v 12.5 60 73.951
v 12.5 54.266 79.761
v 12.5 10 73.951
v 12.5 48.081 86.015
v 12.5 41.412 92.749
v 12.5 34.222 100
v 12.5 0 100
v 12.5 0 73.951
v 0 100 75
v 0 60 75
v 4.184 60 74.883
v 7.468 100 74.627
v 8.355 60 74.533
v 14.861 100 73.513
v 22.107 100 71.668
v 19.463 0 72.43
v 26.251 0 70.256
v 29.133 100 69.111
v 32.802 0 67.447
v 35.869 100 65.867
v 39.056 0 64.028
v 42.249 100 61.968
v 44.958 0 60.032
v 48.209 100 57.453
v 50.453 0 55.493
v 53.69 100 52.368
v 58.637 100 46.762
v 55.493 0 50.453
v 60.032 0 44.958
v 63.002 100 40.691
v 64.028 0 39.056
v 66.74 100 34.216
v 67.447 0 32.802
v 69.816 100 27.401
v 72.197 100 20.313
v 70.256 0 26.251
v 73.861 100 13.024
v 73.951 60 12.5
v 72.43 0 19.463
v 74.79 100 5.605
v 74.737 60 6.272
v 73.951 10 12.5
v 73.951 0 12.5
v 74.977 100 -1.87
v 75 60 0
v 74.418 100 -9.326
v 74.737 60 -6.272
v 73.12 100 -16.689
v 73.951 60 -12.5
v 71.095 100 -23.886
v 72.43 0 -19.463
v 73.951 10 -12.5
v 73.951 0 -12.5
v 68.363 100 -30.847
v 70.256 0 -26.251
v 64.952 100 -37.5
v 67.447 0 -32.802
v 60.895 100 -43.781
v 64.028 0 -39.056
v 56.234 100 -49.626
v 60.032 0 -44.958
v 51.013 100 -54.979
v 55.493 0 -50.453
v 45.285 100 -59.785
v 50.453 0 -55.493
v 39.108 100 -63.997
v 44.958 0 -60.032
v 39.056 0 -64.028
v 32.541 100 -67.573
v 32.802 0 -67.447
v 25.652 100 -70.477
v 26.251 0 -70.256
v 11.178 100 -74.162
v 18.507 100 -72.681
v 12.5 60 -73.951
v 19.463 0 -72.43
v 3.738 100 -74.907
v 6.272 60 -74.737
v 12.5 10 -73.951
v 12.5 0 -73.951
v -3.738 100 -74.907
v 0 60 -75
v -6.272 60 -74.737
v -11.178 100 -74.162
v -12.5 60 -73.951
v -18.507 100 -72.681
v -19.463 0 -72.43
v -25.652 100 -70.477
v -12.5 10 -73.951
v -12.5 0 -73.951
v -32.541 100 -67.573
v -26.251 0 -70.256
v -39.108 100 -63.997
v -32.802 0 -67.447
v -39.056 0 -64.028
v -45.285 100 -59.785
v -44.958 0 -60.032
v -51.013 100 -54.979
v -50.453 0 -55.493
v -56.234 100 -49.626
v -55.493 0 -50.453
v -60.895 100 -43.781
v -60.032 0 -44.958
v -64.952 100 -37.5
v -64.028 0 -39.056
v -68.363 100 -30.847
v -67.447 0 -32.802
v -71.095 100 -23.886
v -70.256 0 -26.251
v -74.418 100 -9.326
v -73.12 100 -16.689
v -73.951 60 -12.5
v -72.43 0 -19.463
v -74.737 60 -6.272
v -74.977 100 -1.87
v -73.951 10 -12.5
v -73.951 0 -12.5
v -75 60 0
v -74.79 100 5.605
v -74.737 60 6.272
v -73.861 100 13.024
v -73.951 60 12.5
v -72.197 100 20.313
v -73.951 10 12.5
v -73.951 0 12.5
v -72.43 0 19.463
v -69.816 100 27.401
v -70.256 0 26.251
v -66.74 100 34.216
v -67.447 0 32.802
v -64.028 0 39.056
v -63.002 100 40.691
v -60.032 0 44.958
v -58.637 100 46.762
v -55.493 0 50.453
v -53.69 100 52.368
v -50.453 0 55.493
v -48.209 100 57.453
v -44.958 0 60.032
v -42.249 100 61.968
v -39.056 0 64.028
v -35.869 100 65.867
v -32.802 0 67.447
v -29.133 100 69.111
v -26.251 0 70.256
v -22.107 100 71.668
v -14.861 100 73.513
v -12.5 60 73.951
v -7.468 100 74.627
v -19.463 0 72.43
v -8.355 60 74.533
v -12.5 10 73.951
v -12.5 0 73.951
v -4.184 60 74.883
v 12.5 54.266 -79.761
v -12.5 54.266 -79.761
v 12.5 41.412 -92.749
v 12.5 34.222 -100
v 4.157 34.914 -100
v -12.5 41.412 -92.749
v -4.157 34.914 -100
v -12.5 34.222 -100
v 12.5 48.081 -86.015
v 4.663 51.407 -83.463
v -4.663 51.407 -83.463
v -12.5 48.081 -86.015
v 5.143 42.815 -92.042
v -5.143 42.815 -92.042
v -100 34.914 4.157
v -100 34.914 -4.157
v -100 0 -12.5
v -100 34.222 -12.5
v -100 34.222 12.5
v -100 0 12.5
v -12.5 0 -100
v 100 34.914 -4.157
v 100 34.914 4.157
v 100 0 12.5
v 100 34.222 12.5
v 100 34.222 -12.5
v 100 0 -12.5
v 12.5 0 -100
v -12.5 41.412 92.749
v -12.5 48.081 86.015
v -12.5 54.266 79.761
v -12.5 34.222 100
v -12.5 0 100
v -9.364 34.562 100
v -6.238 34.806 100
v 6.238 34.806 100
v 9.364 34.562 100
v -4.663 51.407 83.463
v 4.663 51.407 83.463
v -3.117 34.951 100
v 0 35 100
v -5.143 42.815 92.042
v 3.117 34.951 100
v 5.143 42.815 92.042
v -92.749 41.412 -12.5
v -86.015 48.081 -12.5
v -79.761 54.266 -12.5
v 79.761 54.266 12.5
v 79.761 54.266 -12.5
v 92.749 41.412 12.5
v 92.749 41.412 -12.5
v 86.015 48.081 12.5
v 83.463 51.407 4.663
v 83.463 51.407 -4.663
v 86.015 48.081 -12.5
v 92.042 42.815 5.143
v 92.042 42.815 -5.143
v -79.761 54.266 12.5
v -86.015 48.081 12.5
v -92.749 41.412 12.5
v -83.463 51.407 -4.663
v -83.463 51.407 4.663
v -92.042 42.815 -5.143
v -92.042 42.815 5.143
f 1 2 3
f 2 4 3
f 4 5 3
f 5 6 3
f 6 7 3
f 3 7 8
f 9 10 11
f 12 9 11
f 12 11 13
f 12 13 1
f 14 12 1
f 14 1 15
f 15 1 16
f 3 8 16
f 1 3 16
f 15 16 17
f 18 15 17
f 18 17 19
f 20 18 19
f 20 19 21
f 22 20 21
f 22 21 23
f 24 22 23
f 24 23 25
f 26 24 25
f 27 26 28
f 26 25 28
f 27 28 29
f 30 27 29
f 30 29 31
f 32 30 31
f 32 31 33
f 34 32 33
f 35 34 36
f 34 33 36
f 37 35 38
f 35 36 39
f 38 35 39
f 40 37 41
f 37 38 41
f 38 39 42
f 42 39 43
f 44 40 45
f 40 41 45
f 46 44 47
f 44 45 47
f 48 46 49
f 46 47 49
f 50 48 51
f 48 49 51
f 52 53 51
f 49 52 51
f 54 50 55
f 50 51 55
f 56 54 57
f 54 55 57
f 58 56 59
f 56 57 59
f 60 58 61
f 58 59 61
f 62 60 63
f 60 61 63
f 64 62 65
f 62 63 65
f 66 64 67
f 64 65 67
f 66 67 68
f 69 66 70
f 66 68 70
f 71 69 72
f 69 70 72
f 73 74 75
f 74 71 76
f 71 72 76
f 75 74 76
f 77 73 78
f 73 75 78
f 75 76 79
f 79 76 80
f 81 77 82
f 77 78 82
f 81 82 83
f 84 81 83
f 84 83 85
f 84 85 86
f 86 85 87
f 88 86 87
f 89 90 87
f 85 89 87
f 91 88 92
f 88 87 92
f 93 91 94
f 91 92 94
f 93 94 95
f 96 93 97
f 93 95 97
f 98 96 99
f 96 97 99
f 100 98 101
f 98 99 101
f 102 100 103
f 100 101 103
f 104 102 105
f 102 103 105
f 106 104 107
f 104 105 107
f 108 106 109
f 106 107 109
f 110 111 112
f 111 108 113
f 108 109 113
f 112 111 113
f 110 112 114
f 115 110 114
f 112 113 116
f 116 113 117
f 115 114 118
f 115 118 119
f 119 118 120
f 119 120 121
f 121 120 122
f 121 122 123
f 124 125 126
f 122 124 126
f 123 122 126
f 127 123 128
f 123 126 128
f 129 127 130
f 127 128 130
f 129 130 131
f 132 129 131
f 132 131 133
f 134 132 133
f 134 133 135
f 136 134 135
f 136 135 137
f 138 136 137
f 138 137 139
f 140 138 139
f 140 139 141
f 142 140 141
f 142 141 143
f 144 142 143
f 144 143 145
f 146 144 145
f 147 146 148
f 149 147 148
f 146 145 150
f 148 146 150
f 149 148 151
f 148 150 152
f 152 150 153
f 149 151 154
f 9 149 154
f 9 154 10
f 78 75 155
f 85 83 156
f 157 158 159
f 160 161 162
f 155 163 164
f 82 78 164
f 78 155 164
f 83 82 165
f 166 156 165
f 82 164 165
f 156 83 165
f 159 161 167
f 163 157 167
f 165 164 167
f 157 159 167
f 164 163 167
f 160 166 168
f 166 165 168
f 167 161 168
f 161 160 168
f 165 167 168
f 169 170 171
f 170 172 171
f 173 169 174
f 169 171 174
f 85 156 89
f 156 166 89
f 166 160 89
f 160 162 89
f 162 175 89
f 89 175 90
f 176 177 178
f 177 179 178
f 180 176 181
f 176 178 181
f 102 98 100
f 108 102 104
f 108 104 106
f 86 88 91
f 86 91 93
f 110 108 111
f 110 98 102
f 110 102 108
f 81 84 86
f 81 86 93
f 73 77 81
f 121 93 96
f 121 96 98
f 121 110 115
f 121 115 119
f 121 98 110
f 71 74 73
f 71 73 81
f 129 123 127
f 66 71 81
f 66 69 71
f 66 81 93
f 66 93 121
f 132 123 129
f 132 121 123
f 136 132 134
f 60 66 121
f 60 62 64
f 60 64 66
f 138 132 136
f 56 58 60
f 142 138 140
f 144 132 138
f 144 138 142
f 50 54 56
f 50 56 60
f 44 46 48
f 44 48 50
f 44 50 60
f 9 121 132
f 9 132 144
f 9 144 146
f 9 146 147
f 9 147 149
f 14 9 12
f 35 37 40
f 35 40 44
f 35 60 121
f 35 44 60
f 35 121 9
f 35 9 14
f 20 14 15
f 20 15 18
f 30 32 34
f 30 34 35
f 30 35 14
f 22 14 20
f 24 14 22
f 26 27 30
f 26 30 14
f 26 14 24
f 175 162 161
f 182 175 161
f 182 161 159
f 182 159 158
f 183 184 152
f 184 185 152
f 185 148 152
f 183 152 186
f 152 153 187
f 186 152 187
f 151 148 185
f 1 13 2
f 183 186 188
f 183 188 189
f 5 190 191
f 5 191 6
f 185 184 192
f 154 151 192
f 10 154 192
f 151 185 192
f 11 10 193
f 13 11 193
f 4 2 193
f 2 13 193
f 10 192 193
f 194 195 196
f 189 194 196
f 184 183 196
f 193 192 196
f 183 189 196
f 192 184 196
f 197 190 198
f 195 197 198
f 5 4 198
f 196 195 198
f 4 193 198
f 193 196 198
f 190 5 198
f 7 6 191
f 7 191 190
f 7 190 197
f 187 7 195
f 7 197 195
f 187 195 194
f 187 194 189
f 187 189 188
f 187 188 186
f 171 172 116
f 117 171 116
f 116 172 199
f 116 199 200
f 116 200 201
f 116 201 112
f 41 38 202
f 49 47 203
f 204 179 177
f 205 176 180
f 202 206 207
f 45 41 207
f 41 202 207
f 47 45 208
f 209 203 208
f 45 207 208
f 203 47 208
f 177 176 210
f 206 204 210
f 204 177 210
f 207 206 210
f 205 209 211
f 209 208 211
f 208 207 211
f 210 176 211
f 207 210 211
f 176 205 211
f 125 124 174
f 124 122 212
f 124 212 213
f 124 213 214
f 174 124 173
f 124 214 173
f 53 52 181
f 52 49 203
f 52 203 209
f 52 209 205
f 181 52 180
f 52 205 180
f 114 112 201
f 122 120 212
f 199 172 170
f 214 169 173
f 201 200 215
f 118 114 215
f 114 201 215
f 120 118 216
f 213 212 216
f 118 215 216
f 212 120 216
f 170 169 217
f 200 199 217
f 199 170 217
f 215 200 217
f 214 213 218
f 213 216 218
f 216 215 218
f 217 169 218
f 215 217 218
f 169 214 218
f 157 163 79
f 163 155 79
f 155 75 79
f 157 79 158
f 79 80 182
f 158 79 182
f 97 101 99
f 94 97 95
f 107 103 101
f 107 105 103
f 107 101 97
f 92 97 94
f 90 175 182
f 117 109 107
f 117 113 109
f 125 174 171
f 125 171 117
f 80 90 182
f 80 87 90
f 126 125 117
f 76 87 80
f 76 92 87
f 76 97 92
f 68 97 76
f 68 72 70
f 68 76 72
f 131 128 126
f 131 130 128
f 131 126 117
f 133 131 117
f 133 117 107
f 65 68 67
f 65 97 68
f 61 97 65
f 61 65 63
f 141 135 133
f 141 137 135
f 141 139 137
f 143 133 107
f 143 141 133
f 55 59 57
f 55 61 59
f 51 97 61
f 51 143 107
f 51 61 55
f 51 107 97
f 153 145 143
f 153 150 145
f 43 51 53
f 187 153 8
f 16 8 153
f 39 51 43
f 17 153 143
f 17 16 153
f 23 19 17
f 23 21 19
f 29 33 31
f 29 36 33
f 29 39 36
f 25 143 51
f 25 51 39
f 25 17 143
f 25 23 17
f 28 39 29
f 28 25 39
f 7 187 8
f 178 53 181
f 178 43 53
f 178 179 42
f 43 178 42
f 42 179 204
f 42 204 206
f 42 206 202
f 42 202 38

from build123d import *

# Parameters (mm, degrees)
SKETCH1_R           = 75
BOSS_EXTRUDE1_DEPTH = 100
BOSS_EXTRUDE2_DEPTH = 10
CHAMFER1_SIZE       = 50


with BuildPart() as part:
    # Sketch1 → Boss-Extrude1 (new body)
    with BuildSketch(Plane(origin=(0, 0, 0), x_dir=(1, 0, 0), z_dir=(0, 1, 0))):
        with Locations(Location((0, 0, 0), (0, 0, 270))):
            Circle(SKETCH1_R)
    extrude(amount=BOSS_EXTRUDE1_DEPTH)

    # Sketch2 → Boss-Extrude2 (add)
    with BuildSketch(Plane.XZ):
        with BuildLine():
            Line((-100, 12.5), (-100, -12.5))
            Line((-100, -12.5), (-73.950997289, -12.5))
            ThreePointArc((-73.950997289, -12.5), (-75, 0), (-73.950997289, 12.5))
            Line((-73.950997289, 12.5), (-100, 12.5))
        make_face()
        with BuildLine():
            ThreePointArc((75, 0), (74.737289209, -6.271969521), (73.950997289, -12.5))
            Line((73.950997289, -12.5), (100, -12.5))
            Line((100, -12.5), (100, 12.5))
            Line((100, 12.5), (73.950997289, 12.5))
            ThreePointArc((73.950997289, 12.5), (74.737289209, 6.271969521), (75, 0))
        make_face()
        with BuildLine():
            Line((-12.5, 100), (-12.5, 73.950997289))
            ThreePointArc((-12.5, 73.950997289), (0, 75), (12.5, 73.950997289))
            Line((12.5, 73.950997289), (12.5, 100))
            Line((12.5, 100), (-12.5, 100))
        make_face()
        with BuildLine():
            ThreePointArc((12.5, -73.950997289), (0, -75), (-12.5, -73.950997289))
            Line((-12.5, -73.950997289), (-12.5, -100))
            Line((-12.5, -100), (12.5, -100))
            Line((12.5, -100), (12.5, -73.950997289))
        make_face()
    extrude(amount=-BOSS_EXTRUDE2_DEPTH)

    # Chamfer1
    # the kernel refuses this chamfer: 50 mm, written as the material it adds along each edge
    with BuildSketch(Plane(origin=(0, 10, 0), x_dir=(0.9519856818942184, 0, 0.30614255089484044), z_dir=(-0.30614255089484044, 0, 0.9519856818942184))) as chamfer1_piece_1_section:
        Polygon((75, CHAMFER1_SIZE), (75 + CHAMFER1_SIZE, 0), (75, 0), align=None)
    chamfer1_piece_1 = revolve(axis=Axis((0, 10, 0), (0, 1, 0)), revolution_arc=215.653831418, mode=Mode.PRIVATE)
    chamfer1_piece_1 = split(chamfer1_piece_1, bisect_by=Plane(origin=(-12.5, 29.622120316, 1e-09), z_dir=(1, 0, 0)), keep=Keep.TOP, mode=Mode.PRIVATE)
    chamfer1_piece_1 = split(chamfer1_piece_1, bisect_by=Plane(origin=(85.193298793, 29.622120316, 12.5), z_dir=(0, 0, -1)), keep=Keep.TOP, mode=Mode.PRIVATE)
    chamfer1_piece_1 = split(chamfer1_piece_1, bisect_by=Plane(origin=(85.193298793, 29.622120316, -12.5), z_dir=(0, 0, 1)), keep=Keep.TOP, mode=Mode.PRIVATE)
    chamfer1_piece_1 = split(chamfer1_piece_1, bisect_by=Plane(origin=(100, 29.622120316, 1e-09), z_dir=(-1, 0, 0)), keep=Keep.TOP, mode=Mode.PRIVATE)
    add(chamfer1_piece_1)
    with BuildSketch(Plane(origin=(0, 10, 0), x_dir=(0.9519856818942184, 0, 0.30614255089484044), z_dir=(-0.30614255089484044, 0, 0.9519856818942184))) as chamfer1_piece_2_section:
        Polygon((75, CHAMFER1_SIZE), (75 + CHAMFER1_SIZE, 0), (75, 0), align=None)
    chamfer1_piece_2 = revolve(axis=Axis((0, 10, 0), (0, 1, 0)), revolution_arc=215.653831418, mode=Mode.PRIVATE)
    chamfer1_piece_2 = split(chamfer1_piece_2, bisect_by=Plane(origin=(12.5, 29.62212033, -85.19329881), z_dir=(-1, 0, 0)), keep=Keep.TOP, mode=Mode.PRIVATE)
    chamfer1_piece_2 = split(chamfer1_piece_2, bisect_by=Plane(origin=(-12.5, 29.62212033, -85.19329881), z_dir=(1, 0, 0)), keep=Keep.TOP, mode=Mode.PRIVATE)
    chamfer1_piece_2 = split(chamfer1_piece_2, bisect_by=Plane(origin=(0, 29.62212033, -100), z_dir=(0, 0, 1)), keep=Keep.TOP, mode=Mode.PRIVATE)
    add(chamfer1_piece_2)
    with BuildSketch(Plane(origin=(0, 10, 0), x_dir=(0.9519856818942184, 0, 0.30614255089484044), z_dir=(-0.30614255089484044, 0, 0.9519856818942184))) as chamfer1_piece_3_section:
        Polygon((75, CHAMFER1_SIZE), (75 + CHAMFER1_SIZE, 0), (75, 0), align=None)
    chamfer1_piece_3 = revolve(axis=Axis((0, 10, 0), (0, 1, 0)), revolution_arc=215.653831418, mode=Mode.PRIVATE)
    chamfer1_piece_3 = split(chamfer1_piece_3, bisect_by=Plane(origin=(-12.5, 29.622120318, 1e-09), z_dir=(-1, 0, 0)), keep=Keep.TOP, mode=Mode.PRIVATE)
    chamfer1_piece_3 = split(chamfer1_piece_3, bisect_by=Plane(origin=(-85.193298793, 29.622120318, 12.5), z_dir=(0, 0, -1)), keep=Keep.TOP, mode=Mode.PRIVATE)
    chamfer1_piece_3 = split(chamfer1_piece_3, bisect_by=Plane(origin=(-85.193298793, 29.622120318, -12.5), z_dir=(0, 0, 1)), keep=Keep.TOP, mode=Mode.PRIVATE)
    chamfer1_piece_3 = split(chamfer1_piece_3, bisect_by=Plane(origin=(-100, 29.622120318, 1e-09), z_dir=(1, 0, 0)), keep=Keep.TOP, mode=Mode.PRIVATE)
    add(chamfer1_piece_3)
    with BuildSketch(Plane(origin=(0, 10, 0), x_dir=(-0.30614255089485254, 0, 0.9519856818942145), z_dir=(-0.9519856818942145, 0, -0.30614255089485254))) as chamfer1_piece_4_section:
        Polygon((75, CHAMFER1_SIZE), (75 + CHAMFER1_SIZE, 0), (75, 0), align=None)
    chamfer1_piece_4 = revolve(axis=Axis((0, 10, 0), (0, 1, 0)), revolution_arc=215.653831418, mode=Mode.PRIVATE)
    chamfer1_piece_4 = split(chamfer1_piece_4, bisect_by=Plane(origin=(-1e-09, 29.622120316, -12.5), z_dir=(0, 0, 1)), keep=Keep.TOP, mode=Mode.PRIVATE)
    chamfer1_piece_4 = split(chamfer1_piece_4, bisect_by=Plane(origin=(12.5, 29.622120316, 85.193298793), z_dir=(-1, 0, 0)), keep=Keep.TOP, mode=Mode.PRIVATE)
    chamfer1_piece_4 = split(chamfer1_piece_4, bisect_by=Plane(origin=(-1e-09, 29.622120316, 100), z_dir=(0, 0, -1)), keep=Keep.TOP, mode=Mode.PRIVATE)
    chamfer1_piece_4 = split(chamfer1_piece_4, bisect_by=Plane(origin=(-12.5, 29.622120316, 85.193298793), z_dir=(1, 0, 0)), keep=Keep.TOP, mode=Mode.PRIVATE)
    add(chamfer1_piece_4)
    with BuildSketch(Plane(origin=(0, 10, 0), x_dir=(-0.30614255089485254, 0, 0.9519856818942145), z_dir=(-0.9519856818942145, 0, -0.30614255089485254))) as chamfer1_piece_5_section:
        Polygon((75, CHAMFER1_SIZE), (75 + CHAMFER1_SIZE, 0), (75, 0), align=None)
    chamfer1_piece_5 = revolve(axis=Axis((0, 10, 0), (0, 1, 0)), revolution_arc=215.653831418, mode=Mode.PRIVATE)
    chamfer1_piece_5 = split(chamfer1_piece_5, bisect_by=Plane(origin=(85.19329881, 29.62212033, 12.5), z_dir=(0, 0, -1)), keep=Keep.TOP, mode=Mode.PRIVATE)
    chamfer1_piece_5 = split(chamfer1_piece_5, bisect_by=Plane(origin=(85.19329881, 29.62212033, -12.5), z_dir=(0, 0, 1)), keep=Keep.TOP, mode=Mode.PRIVATE)
    chamfer1_piece_5 = split(chamfer1_piece_5, bisect_by=Plane(origin=(100, 29.62212033, 0), z_dir=(-1, 0, 0)), keep=Keep.TOP, mode=Mode.PRIVATE)
    add(chamfer1_piece_5)
    with BuildSketch(Plane(origin=(0, 10, 0), x_dir=(-0.30614255089485254, 0, 0.9519856818942145), z_dir=(-0.9519856818942145, 0, -0.30614255089485254))) as chamfer1_piece_6_section:
        Polygon((75, CHAMFER1_SIZE), (75 + CHAMFER1_SIZE, 0), (75, 0), align=None)
    chamfer1_piece_6 = revolve(axis=Axis((0, 10, 0), (0, 1, 0)), revolution_arc=215.653831418, mode=Mode.PRIVATE)
    chamfer1_piece_6 = split(chamfer1_piece_6, bisect_by=Plane(origin=(-1e-09, 29.622120318, -12.5), z_dir=(0, 0, -1)), keep=Keep.TOP, mode=Mode.PRIVATE)
    chamfer1_piece_6 = split(chamfer1_piece_6, bisect_by=Plane(origin=(12.5, 29.622120318, -85.193298793), z_dir=(-1, 0, 0)), keep=Keep.TOP, mode=Mode.PRIVATE)
    chamfer1_piece_6 = split(chamfer1_piece_6, bisect_by=Plane(origin=(-12.5, 29.622120318, -85.193298793), z_dir=(1, 0, 0)), keep=Keep.TOP, mode=Mode.PRIVATE)
    chamfer1_piece_6 = split(chamfer1_piece_6, bisect_by=Plane(origin=(-1e-09, 29.622120318, -100), z_dir=(0, 0, 1)), keep=Keep.TOP, mode=Mode.PRIVATE)
    add(chamfer1_piece_6)
    with BuildSketch(Plane(origin=(0, 10, 0), x_dir=(-0.9519928676316486, 0, -0.3061202051130742), z_dir=(0.3061202051130742, 0, -0.9519928676316486))) as chamfer1_piece_7_section:
        Polygon((75, CHAMFER1_SIZE), (75 + CHAMFER1_SIZE, 0), (75, 0), align=None)
    chamfer1_piece_7 = revolve(axis=Axis((0, 10, 0), (0, 1, 0)), revolution_arc=107.825570821, mode=Mode.PRIVATE)
    chamfer1_piece_7 = split(chamfer1_piece_7, bisect_by=Plane(origin=(-85.193298794, 29.622120316, -12.5), z_dir=(0, 0, 1)), keep=Keep.TOP, mode=Mode.PRIVATE)
    chamfer1_piece_7 = split(chamfer1_piece_7, bisect_by=Plane(origin=(-85.193298794, 29.622120316, 12.5), z_dir=(0, 0, -1)), keep=Keep.TOP, mode=Mode.PRIVATE)
    chamfer1_piece_7 = split(chamfer1_piece_7, bisect_by=Plane(origin=(-100, 29.622120316, -1e-09), z_dir=(1, 0, 0)), keep=Keep.TOP, mode=Mode.PRIVATE)
    add(chamfer1_piece_7)
    with BuildSketch(Plane(origin=(0, 10, 0), x_dir=(-0.9519928676316486, 0, -0.3061202051130742), z_dir=(0.3061202051130742, 0, -0.9519928676316486))) as chamfer1_piece_8_section:
        Polygon((75, CHAMFER1_SIZE), (75 + CHAMFER1_SIZE, 0), (75, 0), align=None)
    chamfer1_piece_8 = revolve(axis=Axis((0, 10, 0), (0, 1, 0)), revolution_arc=107.825570821, mode=Mode.PRIVATE)
    chamfer1_piece_8 = split(chamfer1_piece_8, bisect_by=Plane(origin=(-12.5, 29.622120326, 85.193298813), z_dir=(1, 0, 0)), keep=Keep.TOP, mode=Mode.PRIVATE)
    chamfer1_piece_8 = split(chamfer1_piece_8, bisect_by=Plane(origin=(-6.281740257, 29.622120326, 100), z_dir=(0, 0, -1)), keep=Keep.TOP, mode=Mode.PRIVATE)
    add(chamfer1_piece_8)
    with BuildSketch(Plane(origin=(0, 10, 0), x_dir=(0.30614255089486275, 0, -0.9519856818942113), z_dir=(0.9519856818942113, 0, 0.30614255089486275))) as chamfer1_piece_9_section:
        Polygon((75, CHAMFER1_SIZE), (75 + CHAMFER1_SIZE, 0), (75, 0), align=None)
    chamfer1_piece_9 = revolve(axis=Axis((0, 10, 0), (0, 1, 0)), revolution_arc=215.653831418, mode=Mode.PRIVATE)
    chamfer1_piece_9 = split(chamfer1_piece_9, bisect_by=Plane(origin=(1e-09, 29.622120316, 12.5), z_dir=(0, 0, -1)), keep=Keep.TOP, mode=Mode.PRIVATE)
    chamfer1_piece_9 = split(chamfer1_piece_9, bisect_by=Plane(origin=(12.5, 29.622120316, -85.193298793), z_dir=(-1, 0, 0)), keep=Keep.TOP, mode=Mode.PRIVATE)
    chamfer1_piece_9 = split(chamfer1_piece_9, bisect_by=Plane(origin=(-12.5, 29.622120316, -85.193298793), z_dir=(1, 0, 0)), keep=Keep.TOP, mode=Mode.PRIVATE)
    chamfer1_piece_9 = split(chamfer1_piece_9, bisect_by=Plane(origin=(1e-09, 29.622120316, -100), z_dir=(0, 0, 1)), keep=Keep.TOP, mode=Mode.PRIVATE)
    add(chamfer1_piece_9)
    with BuildSketch(Plane(origin=(0, 10, 0), x_dir=(0.30614255089486275, 0, -0.9519856818942113), z_dir=(0.9519856818942113, 0, 0.30614255089486275))) as chamfer1_piece_10_section:
        Polygon((75, CHAMFER1_SIZE), (75 + CHAMFER1_SIZE, 0), (75, 0), align=None)
    chamfer1_piece_10 = revolve(axis=Axis((0, 10, 0), (0, 1, 0)), revolution_arc=215.653831418, mode=Mode.PRIVATE)
    chamfer1_piece_10 = split(chamfer1_piece_10, bisect_by=Plane(origin=(-85.19329881, 29.62212033, -12.5), z_dir=(0, 0, 1)), keep=Keep.TOP, mode=Mode.PRIVATE)
    chamfer1_piece_10 = split(chamfer1_piece_10, bisect_by=Plane(origin=(-85.19329881, 29.62212033, 12.5), z_dir=(0, 0, -1)), keep=Keep.TOP, mode=Mode.PRIVATE)
    chamfer1_piece_10 = split(chamfer1_piece_10, bisect_by=Plane(origin=(-100, 29.62212033, 0), z_dir=(1, 0, 0)), keep=Keep.TOP, mode=Mode.PRIVATE)
    add(chamfer1_piece_10)
    with BuildSketch(Plane(origin=(0, 10, 0), x_dir=(0.30614255089486275, 0, -0.9519856818942113), z_dir=(0.9519856818942113, 0, 0.30614255089486275))) as chamfer1_piece_11_section:
        Polygon((75, CHAMFER1_SIZE), (75 + CHAMFER1_SIZE, 0), (75, 0), align=None)
    chamfer1_piece_11 = revolve(axis=Axis((0, 10, 0), (0, 1, 0)), revolution_arc=215.653831418, mode=Mode.PRIVATE)
    chamfer1_piece_11 = split(chamfer1_piece_11, bisect_by=Plane(origin=(1e-09, 29.622120318, 12.5), z_dir=(0, 0, 1)), keep=Keep.TOP, mode=Mode.PRIVATE)
    chamfer1_piece_11 = split(chamfer1_piece_11, bisect_by=Plane(origin=(12.5, 29.622120318, 85.193298793), z_dir=(-1, 0, 0)), keep=Keep.TOP, mode=Mode.PRIVATE)
    chamfer1_piece_11 = split(chamfer1_piece_11, bisect_by=Plane(origin=(1e-09, 29.622120318, 100), z_dir=(0, 0, -1)), keep=Keep.TOP, mode=Mode.PRIVATE)
    chamfer1_piece_11 = split(chamfer1_piece_11, bisect_by=Plane(origin=(-12.5, 29.622120318, 85.193298793), z_dir=(1, 0, 0)), keep=Keep.TOP, mode=Mode.PRIVATE)
    add(chamfer1_piece_11)
    with BuildSketch(Plane(origin=(0, 10, 0), x_dir=(0, 0, 1), z_dir=(-1, 0, 0))) as chamfer1_piece_12_section:
        Polygon((75, CHAMFER1_SIZE), (75 + CHAMFER1_SIZE, 0), (75, 0), align=None)
    chamfer1_piece_12 = revolve(axis=Axis((0, 10, 0), (0, 1, 0)), revolution_arc=107.825570821, mode=Mode.PRIVATE)
    chamfer1_piece_12 = split(chamfer1_piece_12, bisect_by=Plane(origin=(12.5, 29.622120324, 85.193298814), z_dir=(-1, 0, 0)), keep=Keep.TOP, mode=Mode.PRIVATE)
    chamfer1_piece_12 = split(chamfer1_piece_12, bisect_by=Plane(origin=(6.281740257, 29.622120324, 100), z_dir=(0, 0, -1)), keep=Keep.TOP, mode=Mode.PRIVATE)
    add(chamfer1_piece_12)
    with BuildSketch(Plane(origin=(0, 10, 0), x_dir=(0, 0, 1), z_dir=(-1, 0, 0))) as chamfer1_piece_13_section:
        Polygon((75, CHAMFER1_SIZE), (75 + CHAMFER1_SIZE, 0), (75, 0), align=None)
    chamfer1_piece_13 = revolve(axis=Axis((0, 10, 0), (0, 1, 0)), revolution_arc=107.825570821, mode=Mode.PRIVATE)
    chamfer1_piece_13 = split(chamfer1_piece_13, bisect_by=Plane(origin=(85.193298792, 29.622120318, 12.5), z_dir=(0, 0, -1)), keep=Keep.TOP, mode=Mode.PRIVATE)
    chamfer1_piece_13 = split(chamfer1_piece_13, bisect_by=Plane(origin=(85.193298792, 29.622120318, -12.5), z_dir=(0, 0, 1)), keep=Keep.TOP, mode=Mode.PRIVATE)
    chamfer1_piece_13 = split(chamfer1_piece_13, bisect_by=Plane(origin=(100, 29.622120318, -1e-09), z_dir=(-1, 0, 0)), keep=Keep.TOP, mode=Mode.PRIVATE)
    add(chamfer1_piece_13)


solid = part.part
